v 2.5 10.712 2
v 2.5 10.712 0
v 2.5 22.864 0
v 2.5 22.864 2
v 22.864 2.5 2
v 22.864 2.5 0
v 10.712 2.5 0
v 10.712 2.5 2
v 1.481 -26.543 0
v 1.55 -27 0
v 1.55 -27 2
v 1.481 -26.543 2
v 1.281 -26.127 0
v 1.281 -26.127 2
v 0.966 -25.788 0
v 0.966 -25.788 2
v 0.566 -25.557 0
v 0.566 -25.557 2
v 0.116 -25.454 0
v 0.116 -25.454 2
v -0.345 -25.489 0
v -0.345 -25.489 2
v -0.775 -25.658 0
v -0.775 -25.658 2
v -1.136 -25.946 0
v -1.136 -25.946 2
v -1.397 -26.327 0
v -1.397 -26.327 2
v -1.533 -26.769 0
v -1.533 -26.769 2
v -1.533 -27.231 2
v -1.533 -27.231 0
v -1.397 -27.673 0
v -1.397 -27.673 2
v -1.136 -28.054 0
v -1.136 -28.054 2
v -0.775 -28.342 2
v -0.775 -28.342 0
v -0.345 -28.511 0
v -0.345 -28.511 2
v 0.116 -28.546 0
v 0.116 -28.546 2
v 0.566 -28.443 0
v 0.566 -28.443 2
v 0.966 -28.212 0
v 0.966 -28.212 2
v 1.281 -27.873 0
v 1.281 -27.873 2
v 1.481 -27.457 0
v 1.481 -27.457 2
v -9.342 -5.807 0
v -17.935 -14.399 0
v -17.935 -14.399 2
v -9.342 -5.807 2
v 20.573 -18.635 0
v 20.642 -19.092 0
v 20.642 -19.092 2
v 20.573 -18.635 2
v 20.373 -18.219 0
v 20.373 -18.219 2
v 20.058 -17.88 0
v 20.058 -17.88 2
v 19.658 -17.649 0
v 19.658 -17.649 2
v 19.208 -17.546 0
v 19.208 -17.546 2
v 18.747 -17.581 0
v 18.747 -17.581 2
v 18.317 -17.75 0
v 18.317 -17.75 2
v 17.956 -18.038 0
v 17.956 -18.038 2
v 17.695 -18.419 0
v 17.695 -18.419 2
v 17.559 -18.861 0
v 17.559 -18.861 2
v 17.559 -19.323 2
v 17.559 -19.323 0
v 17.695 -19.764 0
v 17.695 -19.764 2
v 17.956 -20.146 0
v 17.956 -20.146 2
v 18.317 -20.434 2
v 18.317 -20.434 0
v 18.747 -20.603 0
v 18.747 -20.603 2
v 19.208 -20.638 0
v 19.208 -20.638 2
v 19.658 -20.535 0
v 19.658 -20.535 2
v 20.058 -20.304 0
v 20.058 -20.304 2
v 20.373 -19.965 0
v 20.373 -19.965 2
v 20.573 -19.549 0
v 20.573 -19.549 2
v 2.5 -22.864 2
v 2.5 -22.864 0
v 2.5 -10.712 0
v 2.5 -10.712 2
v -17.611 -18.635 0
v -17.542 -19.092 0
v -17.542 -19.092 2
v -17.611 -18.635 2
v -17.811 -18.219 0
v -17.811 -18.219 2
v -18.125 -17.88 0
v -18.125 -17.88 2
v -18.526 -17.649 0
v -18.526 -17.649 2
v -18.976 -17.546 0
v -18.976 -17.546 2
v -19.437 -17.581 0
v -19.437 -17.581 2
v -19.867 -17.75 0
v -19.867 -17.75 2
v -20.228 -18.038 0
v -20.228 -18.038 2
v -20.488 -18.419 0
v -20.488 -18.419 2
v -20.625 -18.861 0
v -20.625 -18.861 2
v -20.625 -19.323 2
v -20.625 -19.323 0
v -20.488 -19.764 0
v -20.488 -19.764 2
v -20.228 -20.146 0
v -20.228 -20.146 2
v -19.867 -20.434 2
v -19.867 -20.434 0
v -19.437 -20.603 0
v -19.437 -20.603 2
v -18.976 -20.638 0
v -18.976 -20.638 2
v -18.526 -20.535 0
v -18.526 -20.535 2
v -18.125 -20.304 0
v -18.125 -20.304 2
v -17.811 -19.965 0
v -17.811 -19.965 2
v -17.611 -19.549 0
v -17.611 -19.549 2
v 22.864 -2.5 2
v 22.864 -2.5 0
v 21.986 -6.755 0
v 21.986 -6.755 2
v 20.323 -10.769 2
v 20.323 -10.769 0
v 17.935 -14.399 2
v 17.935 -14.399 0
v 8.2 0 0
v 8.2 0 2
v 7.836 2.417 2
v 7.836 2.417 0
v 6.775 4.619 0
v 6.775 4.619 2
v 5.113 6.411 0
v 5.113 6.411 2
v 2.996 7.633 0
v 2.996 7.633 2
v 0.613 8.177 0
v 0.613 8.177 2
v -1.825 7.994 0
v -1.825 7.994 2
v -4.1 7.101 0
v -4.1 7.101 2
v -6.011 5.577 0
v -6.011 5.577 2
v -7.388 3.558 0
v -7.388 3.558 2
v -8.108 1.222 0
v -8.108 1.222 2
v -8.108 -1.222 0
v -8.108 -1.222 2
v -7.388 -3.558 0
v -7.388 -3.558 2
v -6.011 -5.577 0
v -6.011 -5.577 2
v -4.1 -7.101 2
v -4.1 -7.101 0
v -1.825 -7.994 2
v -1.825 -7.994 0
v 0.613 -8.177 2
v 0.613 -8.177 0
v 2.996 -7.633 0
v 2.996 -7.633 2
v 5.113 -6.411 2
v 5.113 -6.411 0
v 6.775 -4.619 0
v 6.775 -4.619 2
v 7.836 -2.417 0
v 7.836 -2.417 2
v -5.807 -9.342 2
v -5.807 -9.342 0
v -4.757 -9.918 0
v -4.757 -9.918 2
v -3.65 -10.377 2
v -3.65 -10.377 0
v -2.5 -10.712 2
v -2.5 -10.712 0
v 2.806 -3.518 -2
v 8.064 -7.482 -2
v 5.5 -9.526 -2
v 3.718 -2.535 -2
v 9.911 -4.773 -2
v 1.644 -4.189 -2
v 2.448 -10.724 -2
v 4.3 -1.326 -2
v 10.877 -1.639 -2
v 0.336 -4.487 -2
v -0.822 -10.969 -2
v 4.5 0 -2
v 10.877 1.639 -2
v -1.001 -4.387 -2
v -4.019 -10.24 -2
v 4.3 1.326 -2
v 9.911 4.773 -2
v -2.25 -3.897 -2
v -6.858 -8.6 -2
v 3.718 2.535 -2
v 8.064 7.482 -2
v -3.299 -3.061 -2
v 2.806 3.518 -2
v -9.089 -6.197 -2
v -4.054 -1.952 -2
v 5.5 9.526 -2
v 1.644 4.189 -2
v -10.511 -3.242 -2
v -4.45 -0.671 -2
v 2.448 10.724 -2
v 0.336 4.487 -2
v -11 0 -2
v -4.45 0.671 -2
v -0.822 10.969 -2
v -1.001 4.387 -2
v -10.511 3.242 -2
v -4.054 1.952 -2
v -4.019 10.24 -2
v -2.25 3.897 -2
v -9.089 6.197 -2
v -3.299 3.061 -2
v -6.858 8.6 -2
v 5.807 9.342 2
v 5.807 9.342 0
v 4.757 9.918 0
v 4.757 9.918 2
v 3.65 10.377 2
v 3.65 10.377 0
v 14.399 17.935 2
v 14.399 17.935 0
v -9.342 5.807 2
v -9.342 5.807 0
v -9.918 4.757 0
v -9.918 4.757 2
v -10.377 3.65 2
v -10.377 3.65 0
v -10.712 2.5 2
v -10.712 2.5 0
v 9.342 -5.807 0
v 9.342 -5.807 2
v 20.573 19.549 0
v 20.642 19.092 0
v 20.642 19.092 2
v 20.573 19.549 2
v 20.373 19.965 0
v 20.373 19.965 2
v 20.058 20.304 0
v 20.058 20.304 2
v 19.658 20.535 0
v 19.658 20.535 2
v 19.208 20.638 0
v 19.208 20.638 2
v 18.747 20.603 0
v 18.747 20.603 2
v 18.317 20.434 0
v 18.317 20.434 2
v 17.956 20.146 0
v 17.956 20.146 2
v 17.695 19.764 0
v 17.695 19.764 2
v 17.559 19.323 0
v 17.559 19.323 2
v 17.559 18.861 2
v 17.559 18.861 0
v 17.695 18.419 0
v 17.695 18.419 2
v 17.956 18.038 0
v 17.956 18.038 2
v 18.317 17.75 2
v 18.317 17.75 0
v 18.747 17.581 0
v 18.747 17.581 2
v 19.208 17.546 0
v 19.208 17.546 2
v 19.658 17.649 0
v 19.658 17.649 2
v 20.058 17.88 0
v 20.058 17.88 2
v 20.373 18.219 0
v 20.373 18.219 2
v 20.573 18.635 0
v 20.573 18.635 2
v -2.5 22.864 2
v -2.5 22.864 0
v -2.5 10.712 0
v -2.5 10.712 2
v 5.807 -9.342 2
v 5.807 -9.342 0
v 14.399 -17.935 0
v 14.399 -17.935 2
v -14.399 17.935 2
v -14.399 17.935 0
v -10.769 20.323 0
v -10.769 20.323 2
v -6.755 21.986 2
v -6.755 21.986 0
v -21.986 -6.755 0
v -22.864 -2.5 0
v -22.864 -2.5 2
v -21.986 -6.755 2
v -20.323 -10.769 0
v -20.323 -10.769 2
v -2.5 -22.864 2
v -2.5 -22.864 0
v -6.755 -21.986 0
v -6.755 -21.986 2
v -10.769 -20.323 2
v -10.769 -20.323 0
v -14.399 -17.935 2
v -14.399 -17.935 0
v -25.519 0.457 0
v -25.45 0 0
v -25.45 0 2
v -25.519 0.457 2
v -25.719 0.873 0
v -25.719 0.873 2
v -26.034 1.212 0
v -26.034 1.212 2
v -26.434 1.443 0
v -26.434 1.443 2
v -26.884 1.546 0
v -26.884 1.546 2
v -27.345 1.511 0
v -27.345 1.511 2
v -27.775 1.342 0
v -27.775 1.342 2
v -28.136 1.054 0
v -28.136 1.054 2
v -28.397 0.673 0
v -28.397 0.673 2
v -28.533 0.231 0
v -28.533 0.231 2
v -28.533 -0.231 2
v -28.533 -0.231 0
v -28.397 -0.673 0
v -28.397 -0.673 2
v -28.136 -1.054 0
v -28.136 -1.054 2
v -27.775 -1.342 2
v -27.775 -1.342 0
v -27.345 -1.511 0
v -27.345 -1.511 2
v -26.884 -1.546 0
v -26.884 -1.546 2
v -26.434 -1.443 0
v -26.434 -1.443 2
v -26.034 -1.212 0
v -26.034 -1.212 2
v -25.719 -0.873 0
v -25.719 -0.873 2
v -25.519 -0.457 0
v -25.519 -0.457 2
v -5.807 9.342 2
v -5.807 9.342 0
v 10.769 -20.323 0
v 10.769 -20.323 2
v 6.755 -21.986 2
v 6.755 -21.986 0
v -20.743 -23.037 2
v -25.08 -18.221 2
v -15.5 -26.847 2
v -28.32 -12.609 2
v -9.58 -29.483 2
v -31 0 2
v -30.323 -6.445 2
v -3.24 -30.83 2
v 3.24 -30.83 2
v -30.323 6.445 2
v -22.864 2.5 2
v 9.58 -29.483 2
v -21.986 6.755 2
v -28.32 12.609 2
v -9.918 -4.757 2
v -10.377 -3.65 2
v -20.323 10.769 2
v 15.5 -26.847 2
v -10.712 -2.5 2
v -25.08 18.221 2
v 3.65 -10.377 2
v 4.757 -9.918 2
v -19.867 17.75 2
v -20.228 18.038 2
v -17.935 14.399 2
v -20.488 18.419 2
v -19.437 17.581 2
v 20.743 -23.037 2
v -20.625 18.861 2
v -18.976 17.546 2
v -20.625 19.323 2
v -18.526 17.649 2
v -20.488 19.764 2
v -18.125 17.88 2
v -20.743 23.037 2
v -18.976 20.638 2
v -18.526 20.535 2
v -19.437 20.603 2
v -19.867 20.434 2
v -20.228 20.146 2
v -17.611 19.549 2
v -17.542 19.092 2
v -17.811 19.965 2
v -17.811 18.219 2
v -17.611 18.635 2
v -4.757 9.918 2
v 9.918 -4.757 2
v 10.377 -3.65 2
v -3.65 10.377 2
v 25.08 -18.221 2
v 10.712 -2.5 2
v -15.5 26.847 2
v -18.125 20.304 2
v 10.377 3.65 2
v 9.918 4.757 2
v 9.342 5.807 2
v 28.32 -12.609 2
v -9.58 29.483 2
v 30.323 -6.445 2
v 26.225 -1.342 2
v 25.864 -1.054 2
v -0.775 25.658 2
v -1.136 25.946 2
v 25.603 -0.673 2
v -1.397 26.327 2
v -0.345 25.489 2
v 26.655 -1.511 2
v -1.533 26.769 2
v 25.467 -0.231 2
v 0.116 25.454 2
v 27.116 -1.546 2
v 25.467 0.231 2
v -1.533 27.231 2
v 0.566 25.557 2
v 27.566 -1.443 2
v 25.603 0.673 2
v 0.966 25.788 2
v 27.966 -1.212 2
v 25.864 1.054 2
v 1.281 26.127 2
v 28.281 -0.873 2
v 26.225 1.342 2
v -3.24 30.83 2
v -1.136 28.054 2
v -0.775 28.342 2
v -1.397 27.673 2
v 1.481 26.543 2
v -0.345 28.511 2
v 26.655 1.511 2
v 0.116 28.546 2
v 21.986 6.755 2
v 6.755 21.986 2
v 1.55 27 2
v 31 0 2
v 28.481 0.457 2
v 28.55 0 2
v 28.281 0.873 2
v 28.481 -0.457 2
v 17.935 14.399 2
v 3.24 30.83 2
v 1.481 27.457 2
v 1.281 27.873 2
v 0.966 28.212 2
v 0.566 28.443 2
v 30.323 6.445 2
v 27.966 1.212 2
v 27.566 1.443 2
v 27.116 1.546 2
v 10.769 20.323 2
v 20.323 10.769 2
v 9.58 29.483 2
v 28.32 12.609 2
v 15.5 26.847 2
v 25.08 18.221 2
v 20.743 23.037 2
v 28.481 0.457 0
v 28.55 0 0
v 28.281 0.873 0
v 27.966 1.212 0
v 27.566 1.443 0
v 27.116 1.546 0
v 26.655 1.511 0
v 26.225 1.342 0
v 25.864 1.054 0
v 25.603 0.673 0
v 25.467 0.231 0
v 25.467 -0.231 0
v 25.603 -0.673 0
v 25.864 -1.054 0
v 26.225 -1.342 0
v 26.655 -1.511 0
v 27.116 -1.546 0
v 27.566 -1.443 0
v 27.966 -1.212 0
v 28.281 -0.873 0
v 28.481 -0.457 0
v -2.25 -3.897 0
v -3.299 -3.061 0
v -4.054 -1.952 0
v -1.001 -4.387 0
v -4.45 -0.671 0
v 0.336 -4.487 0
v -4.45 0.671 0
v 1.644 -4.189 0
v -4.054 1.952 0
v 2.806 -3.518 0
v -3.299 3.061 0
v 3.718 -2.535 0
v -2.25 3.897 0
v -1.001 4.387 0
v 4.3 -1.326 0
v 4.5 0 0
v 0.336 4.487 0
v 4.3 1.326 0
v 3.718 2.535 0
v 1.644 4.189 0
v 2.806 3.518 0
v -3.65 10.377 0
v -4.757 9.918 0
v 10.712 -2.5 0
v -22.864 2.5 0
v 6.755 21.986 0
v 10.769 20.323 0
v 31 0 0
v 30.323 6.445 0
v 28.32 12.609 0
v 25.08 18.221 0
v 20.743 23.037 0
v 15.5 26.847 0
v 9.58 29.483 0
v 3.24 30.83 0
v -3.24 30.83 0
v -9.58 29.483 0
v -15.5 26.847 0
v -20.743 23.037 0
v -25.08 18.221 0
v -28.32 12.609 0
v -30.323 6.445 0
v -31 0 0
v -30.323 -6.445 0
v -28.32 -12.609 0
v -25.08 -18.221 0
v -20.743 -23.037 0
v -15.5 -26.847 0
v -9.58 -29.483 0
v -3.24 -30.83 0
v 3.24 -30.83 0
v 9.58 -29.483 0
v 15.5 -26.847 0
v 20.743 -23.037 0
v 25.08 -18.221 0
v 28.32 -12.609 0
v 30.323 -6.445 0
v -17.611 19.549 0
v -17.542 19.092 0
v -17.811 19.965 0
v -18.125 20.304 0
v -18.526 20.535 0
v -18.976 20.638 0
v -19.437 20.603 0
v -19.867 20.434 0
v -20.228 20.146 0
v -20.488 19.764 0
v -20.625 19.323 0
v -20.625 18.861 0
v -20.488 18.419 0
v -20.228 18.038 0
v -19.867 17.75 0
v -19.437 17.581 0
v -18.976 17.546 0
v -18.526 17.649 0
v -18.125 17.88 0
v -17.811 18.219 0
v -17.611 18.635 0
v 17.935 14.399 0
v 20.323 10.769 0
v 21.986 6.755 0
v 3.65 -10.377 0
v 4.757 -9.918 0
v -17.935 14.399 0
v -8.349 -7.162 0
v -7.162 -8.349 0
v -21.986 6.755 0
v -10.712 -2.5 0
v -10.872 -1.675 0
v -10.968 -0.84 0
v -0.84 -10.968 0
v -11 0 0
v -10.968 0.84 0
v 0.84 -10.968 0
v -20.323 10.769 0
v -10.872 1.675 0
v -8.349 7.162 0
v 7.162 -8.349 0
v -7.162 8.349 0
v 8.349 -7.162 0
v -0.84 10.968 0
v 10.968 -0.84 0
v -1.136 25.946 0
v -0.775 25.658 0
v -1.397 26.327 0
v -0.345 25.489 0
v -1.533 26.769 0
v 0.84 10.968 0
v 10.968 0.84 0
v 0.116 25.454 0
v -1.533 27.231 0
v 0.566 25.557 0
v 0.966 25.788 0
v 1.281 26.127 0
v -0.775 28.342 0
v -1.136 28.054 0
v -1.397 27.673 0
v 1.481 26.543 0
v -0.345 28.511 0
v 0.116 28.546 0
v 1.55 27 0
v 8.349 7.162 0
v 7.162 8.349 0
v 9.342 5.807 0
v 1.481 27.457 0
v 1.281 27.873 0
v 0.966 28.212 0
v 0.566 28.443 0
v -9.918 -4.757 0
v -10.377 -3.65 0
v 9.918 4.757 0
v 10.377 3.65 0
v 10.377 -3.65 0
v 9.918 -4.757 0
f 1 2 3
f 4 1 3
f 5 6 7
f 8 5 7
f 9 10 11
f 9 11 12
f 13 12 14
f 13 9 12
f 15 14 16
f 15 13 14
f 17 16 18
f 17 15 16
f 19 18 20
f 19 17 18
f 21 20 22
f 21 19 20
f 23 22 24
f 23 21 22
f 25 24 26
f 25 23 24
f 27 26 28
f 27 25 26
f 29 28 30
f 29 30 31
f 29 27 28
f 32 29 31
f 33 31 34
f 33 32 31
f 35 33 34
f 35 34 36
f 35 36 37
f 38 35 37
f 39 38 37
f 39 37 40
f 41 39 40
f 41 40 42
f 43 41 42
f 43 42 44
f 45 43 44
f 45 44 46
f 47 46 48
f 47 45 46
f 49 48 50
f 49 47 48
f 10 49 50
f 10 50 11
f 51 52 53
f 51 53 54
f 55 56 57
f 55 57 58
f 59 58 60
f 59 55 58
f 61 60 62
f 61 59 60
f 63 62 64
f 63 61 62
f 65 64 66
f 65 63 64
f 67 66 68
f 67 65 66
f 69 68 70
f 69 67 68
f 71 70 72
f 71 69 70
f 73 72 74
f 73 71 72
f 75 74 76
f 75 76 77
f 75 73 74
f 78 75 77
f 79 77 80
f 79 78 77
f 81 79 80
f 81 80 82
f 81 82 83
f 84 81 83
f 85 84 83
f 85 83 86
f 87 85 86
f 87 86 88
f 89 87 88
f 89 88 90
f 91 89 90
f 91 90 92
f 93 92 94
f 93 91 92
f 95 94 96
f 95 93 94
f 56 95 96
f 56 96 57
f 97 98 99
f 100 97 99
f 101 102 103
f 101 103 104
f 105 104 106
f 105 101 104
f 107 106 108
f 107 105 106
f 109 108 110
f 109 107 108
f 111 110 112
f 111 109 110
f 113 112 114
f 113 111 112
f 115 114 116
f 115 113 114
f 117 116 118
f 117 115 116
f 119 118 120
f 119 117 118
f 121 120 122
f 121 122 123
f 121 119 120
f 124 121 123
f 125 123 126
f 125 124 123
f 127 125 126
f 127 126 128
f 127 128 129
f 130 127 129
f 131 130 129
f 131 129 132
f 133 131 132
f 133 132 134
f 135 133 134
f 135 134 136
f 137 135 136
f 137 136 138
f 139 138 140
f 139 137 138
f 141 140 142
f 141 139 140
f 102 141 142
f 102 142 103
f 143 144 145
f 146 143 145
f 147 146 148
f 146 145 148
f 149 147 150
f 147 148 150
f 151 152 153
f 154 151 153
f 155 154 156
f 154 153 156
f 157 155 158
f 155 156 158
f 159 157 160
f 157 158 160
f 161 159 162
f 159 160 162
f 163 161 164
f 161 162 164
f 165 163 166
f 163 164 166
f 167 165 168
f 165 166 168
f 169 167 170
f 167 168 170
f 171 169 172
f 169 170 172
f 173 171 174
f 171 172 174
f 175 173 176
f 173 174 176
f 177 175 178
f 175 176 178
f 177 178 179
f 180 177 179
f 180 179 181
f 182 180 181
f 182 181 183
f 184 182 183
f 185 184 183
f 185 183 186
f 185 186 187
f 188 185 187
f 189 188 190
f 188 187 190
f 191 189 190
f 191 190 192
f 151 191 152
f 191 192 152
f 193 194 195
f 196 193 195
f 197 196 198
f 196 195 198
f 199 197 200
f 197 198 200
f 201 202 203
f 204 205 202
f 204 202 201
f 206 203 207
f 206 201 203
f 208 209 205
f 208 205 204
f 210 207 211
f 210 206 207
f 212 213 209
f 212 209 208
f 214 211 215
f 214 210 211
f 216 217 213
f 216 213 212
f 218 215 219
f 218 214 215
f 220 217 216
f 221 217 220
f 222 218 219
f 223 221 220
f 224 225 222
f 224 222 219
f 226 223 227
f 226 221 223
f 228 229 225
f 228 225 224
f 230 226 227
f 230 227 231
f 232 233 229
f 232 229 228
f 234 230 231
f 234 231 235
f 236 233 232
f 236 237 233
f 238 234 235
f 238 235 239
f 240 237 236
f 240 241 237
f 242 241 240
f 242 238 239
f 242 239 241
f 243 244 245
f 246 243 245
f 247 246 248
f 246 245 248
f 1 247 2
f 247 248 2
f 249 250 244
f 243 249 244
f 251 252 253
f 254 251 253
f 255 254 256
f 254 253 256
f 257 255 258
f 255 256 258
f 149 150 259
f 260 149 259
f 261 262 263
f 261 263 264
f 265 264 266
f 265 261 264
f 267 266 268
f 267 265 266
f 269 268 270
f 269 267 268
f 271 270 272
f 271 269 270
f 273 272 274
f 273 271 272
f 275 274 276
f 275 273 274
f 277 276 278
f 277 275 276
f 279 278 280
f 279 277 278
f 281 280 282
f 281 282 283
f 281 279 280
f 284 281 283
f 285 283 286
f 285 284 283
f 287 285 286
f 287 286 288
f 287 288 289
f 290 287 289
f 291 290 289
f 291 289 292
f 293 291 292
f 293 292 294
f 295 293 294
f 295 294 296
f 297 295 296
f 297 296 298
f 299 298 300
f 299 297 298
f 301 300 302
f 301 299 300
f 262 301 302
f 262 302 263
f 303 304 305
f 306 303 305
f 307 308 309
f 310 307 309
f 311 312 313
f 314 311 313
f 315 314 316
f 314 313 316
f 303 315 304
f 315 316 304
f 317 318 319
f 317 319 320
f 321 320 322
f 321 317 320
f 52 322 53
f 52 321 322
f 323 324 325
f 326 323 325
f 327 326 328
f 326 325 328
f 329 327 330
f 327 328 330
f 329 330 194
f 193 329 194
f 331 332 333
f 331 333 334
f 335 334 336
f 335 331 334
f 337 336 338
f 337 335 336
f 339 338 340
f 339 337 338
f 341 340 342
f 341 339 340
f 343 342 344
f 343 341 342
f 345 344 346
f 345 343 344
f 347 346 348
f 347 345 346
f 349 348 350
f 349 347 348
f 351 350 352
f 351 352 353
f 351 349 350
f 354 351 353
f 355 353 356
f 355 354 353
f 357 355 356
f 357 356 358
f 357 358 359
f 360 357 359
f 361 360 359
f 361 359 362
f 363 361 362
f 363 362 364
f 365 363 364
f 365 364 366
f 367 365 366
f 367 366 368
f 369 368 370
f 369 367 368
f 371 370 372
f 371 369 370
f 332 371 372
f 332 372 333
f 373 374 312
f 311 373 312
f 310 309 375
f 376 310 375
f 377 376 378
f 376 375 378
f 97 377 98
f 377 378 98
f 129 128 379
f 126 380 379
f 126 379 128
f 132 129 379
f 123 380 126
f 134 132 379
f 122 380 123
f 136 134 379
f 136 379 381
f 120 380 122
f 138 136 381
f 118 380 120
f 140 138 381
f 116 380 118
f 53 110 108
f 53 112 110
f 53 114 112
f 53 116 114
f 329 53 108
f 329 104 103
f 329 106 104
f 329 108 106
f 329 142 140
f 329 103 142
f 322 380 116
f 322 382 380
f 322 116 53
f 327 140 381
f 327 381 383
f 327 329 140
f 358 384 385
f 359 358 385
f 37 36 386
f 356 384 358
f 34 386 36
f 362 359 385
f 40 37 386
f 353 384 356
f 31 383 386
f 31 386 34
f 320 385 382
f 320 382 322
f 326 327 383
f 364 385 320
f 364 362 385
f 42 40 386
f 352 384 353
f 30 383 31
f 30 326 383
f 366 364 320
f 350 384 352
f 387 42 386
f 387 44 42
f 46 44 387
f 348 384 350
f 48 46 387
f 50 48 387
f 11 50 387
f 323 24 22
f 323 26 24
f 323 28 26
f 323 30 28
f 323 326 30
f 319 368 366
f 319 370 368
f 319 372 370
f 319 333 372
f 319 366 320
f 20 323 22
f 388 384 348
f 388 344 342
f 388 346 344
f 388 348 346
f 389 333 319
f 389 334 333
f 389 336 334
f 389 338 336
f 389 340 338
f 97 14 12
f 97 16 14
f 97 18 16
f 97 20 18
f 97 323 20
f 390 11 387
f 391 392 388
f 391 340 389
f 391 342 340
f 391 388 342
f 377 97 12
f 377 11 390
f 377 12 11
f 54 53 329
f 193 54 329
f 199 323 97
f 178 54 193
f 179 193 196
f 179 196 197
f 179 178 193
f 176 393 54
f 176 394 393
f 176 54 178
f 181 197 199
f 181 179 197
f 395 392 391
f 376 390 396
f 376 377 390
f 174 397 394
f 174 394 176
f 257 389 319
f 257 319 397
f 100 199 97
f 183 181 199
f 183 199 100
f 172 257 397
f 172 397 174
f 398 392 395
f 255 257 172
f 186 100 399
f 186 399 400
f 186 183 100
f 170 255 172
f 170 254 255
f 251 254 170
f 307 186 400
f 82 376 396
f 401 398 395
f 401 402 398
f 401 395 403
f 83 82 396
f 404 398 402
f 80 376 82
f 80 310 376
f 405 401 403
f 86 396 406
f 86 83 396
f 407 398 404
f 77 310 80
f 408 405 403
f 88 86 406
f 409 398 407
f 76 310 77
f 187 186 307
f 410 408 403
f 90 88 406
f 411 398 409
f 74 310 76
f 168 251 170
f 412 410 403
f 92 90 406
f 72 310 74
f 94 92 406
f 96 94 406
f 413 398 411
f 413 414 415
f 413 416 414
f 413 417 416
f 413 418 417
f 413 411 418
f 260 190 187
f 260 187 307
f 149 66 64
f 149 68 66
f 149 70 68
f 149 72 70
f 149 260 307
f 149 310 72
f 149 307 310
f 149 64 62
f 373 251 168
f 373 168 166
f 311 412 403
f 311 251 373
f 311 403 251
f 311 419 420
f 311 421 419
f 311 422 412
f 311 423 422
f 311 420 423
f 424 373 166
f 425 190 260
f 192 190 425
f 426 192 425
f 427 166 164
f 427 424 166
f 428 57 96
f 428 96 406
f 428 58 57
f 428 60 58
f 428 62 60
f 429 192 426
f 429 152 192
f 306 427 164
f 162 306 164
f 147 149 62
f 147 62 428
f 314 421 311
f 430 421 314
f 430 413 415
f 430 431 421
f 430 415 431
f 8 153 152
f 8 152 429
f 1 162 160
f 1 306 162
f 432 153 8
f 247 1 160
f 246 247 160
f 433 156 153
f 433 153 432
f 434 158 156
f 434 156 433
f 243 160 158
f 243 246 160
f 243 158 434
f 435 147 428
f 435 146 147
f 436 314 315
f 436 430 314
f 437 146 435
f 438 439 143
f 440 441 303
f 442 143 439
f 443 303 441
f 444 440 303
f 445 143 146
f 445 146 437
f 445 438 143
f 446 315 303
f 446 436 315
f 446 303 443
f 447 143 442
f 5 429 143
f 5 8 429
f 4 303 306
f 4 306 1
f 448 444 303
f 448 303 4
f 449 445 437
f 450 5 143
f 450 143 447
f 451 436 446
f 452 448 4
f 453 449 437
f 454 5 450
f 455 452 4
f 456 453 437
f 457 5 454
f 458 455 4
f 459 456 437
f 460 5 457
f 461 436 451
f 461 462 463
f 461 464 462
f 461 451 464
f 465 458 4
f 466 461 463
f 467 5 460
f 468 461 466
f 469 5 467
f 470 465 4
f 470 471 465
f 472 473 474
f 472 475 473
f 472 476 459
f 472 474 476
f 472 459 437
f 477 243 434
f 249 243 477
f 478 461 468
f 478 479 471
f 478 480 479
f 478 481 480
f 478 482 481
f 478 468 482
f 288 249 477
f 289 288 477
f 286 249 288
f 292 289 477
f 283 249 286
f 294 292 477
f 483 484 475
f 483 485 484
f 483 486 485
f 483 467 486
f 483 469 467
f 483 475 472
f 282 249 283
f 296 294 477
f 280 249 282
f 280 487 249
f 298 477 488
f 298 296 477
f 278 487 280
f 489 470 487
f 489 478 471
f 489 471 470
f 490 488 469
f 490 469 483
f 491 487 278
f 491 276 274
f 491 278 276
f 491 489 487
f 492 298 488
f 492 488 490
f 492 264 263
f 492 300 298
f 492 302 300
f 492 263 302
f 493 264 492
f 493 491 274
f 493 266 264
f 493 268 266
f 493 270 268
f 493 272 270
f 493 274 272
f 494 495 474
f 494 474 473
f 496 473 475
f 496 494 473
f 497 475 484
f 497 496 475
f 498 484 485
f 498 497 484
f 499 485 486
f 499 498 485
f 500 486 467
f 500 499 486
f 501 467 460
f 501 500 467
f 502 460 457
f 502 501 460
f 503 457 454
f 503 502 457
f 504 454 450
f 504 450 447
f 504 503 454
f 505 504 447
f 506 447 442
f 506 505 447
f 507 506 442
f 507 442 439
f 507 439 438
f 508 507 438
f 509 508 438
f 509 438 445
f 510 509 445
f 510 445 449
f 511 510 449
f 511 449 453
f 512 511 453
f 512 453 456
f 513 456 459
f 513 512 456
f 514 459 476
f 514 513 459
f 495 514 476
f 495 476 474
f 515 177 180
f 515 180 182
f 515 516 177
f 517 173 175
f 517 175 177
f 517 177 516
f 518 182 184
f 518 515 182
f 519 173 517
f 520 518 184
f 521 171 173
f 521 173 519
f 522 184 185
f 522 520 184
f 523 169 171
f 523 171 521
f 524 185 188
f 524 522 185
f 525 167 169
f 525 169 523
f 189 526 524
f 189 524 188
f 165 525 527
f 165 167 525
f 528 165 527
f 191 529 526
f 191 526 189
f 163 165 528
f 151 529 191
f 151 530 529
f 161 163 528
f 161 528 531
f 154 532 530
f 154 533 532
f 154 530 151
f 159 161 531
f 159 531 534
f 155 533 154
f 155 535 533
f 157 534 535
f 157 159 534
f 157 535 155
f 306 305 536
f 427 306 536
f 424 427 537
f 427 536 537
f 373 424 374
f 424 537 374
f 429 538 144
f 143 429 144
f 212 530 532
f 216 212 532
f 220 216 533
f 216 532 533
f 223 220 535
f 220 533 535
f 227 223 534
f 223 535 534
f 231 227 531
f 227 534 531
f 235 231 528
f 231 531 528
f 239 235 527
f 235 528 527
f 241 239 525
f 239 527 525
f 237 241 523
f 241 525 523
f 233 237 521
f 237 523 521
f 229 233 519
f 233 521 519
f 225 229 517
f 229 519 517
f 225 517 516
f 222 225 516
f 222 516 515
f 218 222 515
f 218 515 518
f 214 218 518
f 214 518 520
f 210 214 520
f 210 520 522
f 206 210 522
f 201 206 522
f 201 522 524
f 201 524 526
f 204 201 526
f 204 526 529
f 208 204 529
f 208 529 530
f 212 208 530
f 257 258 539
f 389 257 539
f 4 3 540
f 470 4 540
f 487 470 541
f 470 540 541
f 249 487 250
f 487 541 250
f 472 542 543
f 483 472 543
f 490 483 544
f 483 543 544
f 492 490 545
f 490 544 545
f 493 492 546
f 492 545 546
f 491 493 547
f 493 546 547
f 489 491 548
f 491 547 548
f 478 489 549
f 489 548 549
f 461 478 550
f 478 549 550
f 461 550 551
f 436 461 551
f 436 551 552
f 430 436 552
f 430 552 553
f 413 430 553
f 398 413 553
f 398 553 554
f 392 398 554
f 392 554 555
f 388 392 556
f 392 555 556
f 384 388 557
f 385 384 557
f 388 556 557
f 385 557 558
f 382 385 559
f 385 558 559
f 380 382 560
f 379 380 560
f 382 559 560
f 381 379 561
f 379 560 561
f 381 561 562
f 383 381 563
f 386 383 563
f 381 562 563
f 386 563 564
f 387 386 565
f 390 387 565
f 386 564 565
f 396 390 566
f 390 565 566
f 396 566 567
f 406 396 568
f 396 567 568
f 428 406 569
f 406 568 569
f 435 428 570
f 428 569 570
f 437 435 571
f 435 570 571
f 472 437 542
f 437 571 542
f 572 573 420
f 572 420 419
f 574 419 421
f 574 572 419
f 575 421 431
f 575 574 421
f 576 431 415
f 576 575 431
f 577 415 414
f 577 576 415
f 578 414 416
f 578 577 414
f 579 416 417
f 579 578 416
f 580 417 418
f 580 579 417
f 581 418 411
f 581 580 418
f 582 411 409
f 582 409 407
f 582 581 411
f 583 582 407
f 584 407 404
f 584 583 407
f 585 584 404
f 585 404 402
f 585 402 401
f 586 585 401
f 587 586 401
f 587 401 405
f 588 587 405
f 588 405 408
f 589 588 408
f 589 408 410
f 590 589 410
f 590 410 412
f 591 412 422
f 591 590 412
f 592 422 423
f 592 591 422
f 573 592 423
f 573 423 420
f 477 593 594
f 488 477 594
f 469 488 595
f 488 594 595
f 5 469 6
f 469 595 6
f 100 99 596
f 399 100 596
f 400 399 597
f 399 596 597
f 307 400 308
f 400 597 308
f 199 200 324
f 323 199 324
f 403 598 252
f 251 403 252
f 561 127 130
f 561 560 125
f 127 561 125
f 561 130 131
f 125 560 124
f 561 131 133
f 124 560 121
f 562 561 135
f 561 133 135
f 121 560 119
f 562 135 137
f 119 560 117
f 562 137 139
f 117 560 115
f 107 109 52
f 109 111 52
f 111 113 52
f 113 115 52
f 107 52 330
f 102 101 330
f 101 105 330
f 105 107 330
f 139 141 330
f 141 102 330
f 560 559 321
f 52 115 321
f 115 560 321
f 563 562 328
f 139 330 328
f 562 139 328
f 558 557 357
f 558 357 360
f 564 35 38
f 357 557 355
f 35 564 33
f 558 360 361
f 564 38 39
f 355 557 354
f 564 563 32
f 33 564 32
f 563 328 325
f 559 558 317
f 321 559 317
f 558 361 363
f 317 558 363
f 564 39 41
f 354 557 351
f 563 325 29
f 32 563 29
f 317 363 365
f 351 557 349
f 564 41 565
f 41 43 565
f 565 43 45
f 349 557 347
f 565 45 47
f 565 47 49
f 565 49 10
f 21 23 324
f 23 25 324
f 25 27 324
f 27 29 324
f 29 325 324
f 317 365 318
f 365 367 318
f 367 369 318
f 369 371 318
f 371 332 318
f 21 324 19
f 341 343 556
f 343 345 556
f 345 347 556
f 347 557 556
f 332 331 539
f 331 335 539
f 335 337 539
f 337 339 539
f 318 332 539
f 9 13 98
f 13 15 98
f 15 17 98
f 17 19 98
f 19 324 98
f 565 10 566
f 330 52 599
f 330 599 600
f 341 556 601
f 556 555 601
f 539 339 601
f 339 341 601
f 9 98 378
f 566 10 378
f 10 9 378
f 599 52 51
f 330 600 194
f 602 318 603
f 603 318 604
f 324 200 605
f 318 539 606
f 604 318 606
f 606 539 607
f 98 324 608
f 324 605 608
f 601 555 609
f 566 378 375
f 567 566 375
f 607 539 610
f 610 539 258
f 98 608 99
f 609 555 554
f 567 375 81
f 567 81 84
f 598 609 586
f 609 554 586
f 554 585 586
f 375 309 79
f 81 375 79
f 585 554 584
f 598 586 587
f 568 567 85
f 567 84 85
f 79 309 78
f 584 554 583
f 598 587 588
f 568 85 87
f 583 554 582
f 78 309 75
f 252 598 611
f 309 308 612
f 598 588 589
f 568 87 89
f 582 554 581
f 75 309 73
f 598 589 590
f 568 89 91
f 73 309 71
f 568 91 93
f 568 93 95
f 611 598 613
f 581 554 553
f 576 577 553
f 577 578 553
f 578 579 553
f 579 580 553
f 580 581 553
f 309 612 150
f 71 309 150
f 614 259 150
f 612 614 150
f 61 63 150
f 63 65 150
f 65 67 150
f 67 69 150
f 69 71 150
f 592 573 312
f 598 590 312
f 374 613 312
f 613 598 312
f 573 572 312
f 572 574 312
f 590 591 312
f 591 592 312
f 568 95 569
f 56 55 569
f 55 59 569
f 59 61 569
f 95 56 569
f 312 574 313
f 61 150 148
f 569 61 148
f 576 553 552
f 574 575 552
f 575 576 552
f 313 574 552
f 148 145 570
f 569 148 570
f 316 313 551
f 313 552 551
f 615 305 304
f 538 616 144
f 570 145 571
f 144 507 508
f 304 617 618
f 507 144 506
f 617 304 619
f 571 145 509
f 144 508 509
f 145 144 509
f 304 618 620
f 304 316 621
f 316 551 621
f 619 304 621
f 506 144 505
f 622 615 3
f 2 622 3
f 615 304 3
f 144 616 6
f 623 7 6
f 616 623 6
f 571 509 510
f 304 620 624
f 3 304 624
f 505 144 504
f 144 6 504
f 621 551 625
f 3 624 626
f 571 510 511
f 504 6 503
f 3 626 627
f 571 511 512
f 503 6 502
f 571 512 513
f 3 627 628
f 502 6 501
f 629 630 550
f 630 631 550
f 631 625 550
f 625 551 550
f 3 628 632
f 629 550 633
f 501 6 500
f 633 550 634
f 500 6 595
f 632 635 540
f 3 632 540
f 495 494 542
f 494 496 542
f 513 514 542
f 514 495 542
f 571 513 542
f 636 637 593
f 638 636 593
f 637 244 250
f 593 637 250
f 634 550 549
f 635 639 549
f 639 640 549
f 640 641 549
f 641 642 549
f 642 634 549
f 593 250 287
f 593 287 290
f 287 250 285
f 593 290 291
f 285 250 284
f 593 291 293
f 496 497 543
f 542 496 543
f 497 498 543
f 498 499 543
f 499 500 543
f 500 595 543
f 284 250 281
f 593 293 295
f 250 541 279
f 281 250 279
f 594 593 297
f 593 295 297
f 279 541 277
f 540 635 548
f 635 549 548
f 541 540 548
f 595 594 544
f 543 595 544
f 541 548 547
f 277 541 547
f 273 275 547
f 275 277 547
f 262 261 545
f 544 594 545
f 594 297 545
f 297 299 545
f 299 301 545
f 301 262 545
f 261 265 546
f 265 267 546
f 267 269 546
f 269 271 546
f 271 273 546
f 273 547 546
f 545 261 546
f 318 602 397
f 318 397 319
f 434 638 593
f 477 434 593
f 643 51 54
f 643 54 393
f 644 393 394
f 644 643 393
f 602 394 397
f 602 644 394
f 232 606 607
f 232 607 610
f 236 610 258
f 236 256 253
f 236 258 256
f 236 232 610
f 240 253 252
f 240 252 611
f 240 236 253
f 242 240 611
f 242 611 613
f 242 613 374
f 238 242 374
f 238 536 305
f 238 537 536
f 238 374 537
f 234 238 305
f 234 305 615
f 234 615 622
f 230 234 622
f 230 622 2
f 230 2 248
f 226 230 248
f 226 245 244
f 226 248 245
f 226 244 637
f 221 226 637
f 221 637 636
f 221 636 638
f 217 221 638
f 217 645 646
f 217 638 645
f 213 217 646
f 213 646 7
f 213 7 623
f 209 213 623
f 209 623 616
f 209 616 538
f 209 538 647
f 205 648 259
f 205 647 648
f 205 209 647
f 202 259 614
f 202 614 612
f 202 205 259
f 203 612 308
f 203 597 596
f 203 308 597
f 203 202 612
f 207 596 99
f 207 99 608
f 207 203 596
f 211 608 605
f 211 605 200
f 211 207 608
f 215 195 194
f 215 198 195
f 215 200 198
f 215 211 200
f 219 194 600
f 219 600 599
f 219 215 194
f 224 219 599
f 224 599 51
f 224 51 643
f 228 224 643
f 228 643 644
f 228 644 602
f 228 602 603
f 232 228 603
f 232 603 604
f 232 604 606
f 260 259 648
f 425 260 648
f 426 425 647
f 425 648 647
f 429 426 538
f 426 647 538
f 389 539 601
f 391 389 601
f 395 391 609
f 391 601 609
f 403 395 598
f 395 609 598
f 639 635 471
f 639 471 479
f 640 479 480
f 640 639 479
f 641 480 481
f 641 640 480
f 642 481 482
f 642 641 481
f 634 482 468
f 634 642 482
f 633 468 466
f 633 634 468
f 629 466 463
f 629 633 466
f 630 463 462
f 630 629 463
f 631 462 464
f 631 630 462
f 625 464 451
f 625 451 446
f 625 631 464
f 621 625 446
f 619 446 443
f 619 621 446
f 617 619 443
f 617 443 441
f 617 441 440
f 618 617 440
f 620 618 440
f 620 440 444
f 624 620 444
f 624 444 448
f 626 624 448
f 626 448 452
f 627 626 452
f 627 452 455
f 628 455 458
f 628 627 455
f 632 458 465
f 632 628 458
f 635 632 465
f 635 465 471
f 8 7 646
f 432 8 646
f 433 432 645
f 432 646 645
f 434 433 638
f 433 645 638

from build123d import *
from build123d.topology import SkipClean

# Parameters (mm, degrees)
SKETCH1_R           = 31
SKETCH1_R_2         = 1.55
BOSS_EXTRUDE1_DEPTH = 2
BOSS_EXTRUDE2_START = 2
SKETCH3_R           = 11
BOSS_EXTRUDE2_DEPTH = 2
SKETCH4_R           = 4.5
CUT_EXTRUDE2_DEPTH  = 4
SKETCH2_R           = 8.2
CUT_EXTRUDE1_DEPTH  = 2


with BuildPart() as part:
    # Sketch1 → Boss-Extrude1 (new body)
    with BuildSketch(Plane.XY):
        Circle(SKETCH1_R)
        with Locations((-27, 0)):
            Circle(SKETCH1_R_2, mode=Mode.SUBTRACT)
        with Locations((-19.091883092, 19.091883092)):
            Circle(SKETCH1_R_2, mode=Mode.SUBTRACT)
        with Locations((0, 27)):
            Circle(SKETCH1_R_2, mode=Mode.SUBTRACT)
        with Locations((19.091883092, 19.091883092)):
            Circle(SKETCH1_R_2, mode=Mode.SUBTRACT)
        with Locations((27, 0)):
            Circle(SKETCH1_R_2, mode=Mode.SUBTRACT)
        with Locations((19.091883092, -19.091883092)):
            Circle(SKETCH1_R_2, mode=Mode.SUBTRACT)
        with Locations((0, -27)):
            Circle(SKETCH1_R_2, mode=Mode.SUBTRACT)
        with Locations((-19.091883092, -19.091883092)):
            Circle(SKETCH1_R_2, mode=Mode.SUBTRACT)
        with BuildLine():
            Line((-10.712142643, 2.5), (-22.86372673, 2.5))
            ThreePointArc((-22.86372673, 2.5), (-21.249229248, 8.801718944), (-17.934863167, 14.399329261))
            Line((-17.934863167, 14.399329261), (-9.342395657, 5.806861751))
            ThreePointArc((-9.342395657, 5.806861751), (-10.162674858, 4.209517756), (-10.712142643, 2.5))
        make_face(mode=Mode.SUBTRACT)
        with BuildLine():
            Line((-10.712142643, -2.5), (-22.86372673, -2.5))
            ThreePointArc((-22.86372673, -2.5), (-21.249229248, -8.801718944), (-17.934863167, -14.399329261))
            Line((-17.934863167, -14.399329261), (-9.342395657, -5.806861751))
            ThreePointArc((-9.342395657, -5.806861751), (-10.162674858, -4.209517756), (-10.712142643, -2.5))
        make_face(mode=Mode.SUBTRACT)
        with BuildLine():
            Line((-5.806861751, 9.342395657), (-14.399329261, 17.934863167))
            ThreePointArc((-14.399329261, 17.934863167), (-8.801718944, 21.249229248), (-2.5, 22.86372673))
            Line((-2.5, 22.86372673), (-2.5, 10.712142643))
            ThreePointArc((-2.5, 10.712142643), (-4.209517756, 10.162674858), (-5.806861751, 9.342395657))
        make_face(mode=Mode.SUBTRACT)
        with BuildLine():
            Line((2.5, 10.712142643), (2.5, 22.86372673))
            ThreePointArc((2.5, 22.86372673), (8.801718944, 21.249229248), (14.399329261, 17.934863167))
            Line((14.399329261, 17.934863167), (5.806861751, 9.342395657))
            ThreePointArc((5.806861751, 9.342395657), (4.209517756, 10.162674858), (2.5, 10.712142643))
        make_face(mode=Mode.SUBTRACT)
        with BuildLine():
            Line((9.342395657, 5.806861751), (17.934863167, 14.399329261))
            ThreePointArc((17.934863167, 14.399329261), (21.249229248, 8.801718944), (22.86372673, 2.5))
            Line((22.86372673, 2.5), (10.712142643, 2.5))
            ThreePointArc((10.712142643, 2.5), (10.162674858, 4.209517756), (9.342395657, 5.806861751))
        make_face(mode=Mode.SUBTRACT)
        with BuildLine():
            Line((10.712142643, -2.5), (22.86372673, -2.5))
            ThreePointArc((22.86372673, -2.5), (21.249229248, -8.801718944), (17.934863167, -14.399329261))
            Line((17.934863167, -14.399329261), (9.342395657, -5.806861751))
            ThreePointArc((9.342395657, -5.806861751), (10.162674858, -4.209517756), (10.712142643, -2.5))
        make_face(mode=Mode.SUBTRACT)
        with BuildLine():
            Line((5.806861751, -9.342395657), (14.399329261, -17.934863167))
            ThreePointArc((14.399329261, -17.934863167), (8.801718944, -21.249229248), (2.5, -22.86372673))
            Line((2.5, -22.86372673), (2.5, -10.712142643))
            ThreePointArc((2.5, -10.712142643), (4.209517756, -10.162674858), (5.806861751, -9.342395657))
        make_face(mode=Mode.SUBTRACT)
        with BuildLine():
            Line((-2.5, -10.712142643), (-2.5, -22.86372673))
            ThreePointArc((-2.5, -22.86372673), (-8.801718944, -21.249229248), (-14.399329261, -17.934863167))
            Line((-14.399329261, -17.934863167), (-5.806861751, -9.342395657))
            ThreePointArc((-5.806861751, -9.342395657), (-4.209517756, -10.162674858), (-2.5, -10.712142643))
        make_face(mode=Mode.SUBTRACT)
    extrude(amount=BOSS_EXTRUDE1_DEPTH)

    # Sketch3 → Boss-Extrude2 (add)
    with SkipClean():  # the faces are left unmerged after this step: merging them gives an invalid solid
        with BuildSketch(Plane(origin=(0, 0, 0), x_dir=(-1, 0, 0), z_dir=(0, 0, -1)).offset(BOSS_EXTRUDE2_START)):
            Circle(SKETCH3_R)
        extrude(amount=-BOSS_EXTRUDE2_DEPTH)

    # Sketch4 → Cut-Extrude2 (cut)
    with SkipClean():  # the faces are left unmerged after this step: merging them gives an invalid solid
        with BuildSketch(Plane.XY.offset(2)):
            Circle(SKETCH4_R)
        extrude(amount=-CUT_EXTRUDE2_DEPTH, mode=Mode.SUBTRACT)

    # Sketch2 → Cut-Extrude1 (cut)
    with SkipClean():  # the faces are left unmerged after this step: merging them gives an invalid solid
        with BuildSketch(Plane.XY.offset(2)):
            Circle(SKETCH2_R)
        extrude(amount=-CUT_EXTRUDE1_DEPTH, mode=Mode.SUBTRACT)


solid = part.part
